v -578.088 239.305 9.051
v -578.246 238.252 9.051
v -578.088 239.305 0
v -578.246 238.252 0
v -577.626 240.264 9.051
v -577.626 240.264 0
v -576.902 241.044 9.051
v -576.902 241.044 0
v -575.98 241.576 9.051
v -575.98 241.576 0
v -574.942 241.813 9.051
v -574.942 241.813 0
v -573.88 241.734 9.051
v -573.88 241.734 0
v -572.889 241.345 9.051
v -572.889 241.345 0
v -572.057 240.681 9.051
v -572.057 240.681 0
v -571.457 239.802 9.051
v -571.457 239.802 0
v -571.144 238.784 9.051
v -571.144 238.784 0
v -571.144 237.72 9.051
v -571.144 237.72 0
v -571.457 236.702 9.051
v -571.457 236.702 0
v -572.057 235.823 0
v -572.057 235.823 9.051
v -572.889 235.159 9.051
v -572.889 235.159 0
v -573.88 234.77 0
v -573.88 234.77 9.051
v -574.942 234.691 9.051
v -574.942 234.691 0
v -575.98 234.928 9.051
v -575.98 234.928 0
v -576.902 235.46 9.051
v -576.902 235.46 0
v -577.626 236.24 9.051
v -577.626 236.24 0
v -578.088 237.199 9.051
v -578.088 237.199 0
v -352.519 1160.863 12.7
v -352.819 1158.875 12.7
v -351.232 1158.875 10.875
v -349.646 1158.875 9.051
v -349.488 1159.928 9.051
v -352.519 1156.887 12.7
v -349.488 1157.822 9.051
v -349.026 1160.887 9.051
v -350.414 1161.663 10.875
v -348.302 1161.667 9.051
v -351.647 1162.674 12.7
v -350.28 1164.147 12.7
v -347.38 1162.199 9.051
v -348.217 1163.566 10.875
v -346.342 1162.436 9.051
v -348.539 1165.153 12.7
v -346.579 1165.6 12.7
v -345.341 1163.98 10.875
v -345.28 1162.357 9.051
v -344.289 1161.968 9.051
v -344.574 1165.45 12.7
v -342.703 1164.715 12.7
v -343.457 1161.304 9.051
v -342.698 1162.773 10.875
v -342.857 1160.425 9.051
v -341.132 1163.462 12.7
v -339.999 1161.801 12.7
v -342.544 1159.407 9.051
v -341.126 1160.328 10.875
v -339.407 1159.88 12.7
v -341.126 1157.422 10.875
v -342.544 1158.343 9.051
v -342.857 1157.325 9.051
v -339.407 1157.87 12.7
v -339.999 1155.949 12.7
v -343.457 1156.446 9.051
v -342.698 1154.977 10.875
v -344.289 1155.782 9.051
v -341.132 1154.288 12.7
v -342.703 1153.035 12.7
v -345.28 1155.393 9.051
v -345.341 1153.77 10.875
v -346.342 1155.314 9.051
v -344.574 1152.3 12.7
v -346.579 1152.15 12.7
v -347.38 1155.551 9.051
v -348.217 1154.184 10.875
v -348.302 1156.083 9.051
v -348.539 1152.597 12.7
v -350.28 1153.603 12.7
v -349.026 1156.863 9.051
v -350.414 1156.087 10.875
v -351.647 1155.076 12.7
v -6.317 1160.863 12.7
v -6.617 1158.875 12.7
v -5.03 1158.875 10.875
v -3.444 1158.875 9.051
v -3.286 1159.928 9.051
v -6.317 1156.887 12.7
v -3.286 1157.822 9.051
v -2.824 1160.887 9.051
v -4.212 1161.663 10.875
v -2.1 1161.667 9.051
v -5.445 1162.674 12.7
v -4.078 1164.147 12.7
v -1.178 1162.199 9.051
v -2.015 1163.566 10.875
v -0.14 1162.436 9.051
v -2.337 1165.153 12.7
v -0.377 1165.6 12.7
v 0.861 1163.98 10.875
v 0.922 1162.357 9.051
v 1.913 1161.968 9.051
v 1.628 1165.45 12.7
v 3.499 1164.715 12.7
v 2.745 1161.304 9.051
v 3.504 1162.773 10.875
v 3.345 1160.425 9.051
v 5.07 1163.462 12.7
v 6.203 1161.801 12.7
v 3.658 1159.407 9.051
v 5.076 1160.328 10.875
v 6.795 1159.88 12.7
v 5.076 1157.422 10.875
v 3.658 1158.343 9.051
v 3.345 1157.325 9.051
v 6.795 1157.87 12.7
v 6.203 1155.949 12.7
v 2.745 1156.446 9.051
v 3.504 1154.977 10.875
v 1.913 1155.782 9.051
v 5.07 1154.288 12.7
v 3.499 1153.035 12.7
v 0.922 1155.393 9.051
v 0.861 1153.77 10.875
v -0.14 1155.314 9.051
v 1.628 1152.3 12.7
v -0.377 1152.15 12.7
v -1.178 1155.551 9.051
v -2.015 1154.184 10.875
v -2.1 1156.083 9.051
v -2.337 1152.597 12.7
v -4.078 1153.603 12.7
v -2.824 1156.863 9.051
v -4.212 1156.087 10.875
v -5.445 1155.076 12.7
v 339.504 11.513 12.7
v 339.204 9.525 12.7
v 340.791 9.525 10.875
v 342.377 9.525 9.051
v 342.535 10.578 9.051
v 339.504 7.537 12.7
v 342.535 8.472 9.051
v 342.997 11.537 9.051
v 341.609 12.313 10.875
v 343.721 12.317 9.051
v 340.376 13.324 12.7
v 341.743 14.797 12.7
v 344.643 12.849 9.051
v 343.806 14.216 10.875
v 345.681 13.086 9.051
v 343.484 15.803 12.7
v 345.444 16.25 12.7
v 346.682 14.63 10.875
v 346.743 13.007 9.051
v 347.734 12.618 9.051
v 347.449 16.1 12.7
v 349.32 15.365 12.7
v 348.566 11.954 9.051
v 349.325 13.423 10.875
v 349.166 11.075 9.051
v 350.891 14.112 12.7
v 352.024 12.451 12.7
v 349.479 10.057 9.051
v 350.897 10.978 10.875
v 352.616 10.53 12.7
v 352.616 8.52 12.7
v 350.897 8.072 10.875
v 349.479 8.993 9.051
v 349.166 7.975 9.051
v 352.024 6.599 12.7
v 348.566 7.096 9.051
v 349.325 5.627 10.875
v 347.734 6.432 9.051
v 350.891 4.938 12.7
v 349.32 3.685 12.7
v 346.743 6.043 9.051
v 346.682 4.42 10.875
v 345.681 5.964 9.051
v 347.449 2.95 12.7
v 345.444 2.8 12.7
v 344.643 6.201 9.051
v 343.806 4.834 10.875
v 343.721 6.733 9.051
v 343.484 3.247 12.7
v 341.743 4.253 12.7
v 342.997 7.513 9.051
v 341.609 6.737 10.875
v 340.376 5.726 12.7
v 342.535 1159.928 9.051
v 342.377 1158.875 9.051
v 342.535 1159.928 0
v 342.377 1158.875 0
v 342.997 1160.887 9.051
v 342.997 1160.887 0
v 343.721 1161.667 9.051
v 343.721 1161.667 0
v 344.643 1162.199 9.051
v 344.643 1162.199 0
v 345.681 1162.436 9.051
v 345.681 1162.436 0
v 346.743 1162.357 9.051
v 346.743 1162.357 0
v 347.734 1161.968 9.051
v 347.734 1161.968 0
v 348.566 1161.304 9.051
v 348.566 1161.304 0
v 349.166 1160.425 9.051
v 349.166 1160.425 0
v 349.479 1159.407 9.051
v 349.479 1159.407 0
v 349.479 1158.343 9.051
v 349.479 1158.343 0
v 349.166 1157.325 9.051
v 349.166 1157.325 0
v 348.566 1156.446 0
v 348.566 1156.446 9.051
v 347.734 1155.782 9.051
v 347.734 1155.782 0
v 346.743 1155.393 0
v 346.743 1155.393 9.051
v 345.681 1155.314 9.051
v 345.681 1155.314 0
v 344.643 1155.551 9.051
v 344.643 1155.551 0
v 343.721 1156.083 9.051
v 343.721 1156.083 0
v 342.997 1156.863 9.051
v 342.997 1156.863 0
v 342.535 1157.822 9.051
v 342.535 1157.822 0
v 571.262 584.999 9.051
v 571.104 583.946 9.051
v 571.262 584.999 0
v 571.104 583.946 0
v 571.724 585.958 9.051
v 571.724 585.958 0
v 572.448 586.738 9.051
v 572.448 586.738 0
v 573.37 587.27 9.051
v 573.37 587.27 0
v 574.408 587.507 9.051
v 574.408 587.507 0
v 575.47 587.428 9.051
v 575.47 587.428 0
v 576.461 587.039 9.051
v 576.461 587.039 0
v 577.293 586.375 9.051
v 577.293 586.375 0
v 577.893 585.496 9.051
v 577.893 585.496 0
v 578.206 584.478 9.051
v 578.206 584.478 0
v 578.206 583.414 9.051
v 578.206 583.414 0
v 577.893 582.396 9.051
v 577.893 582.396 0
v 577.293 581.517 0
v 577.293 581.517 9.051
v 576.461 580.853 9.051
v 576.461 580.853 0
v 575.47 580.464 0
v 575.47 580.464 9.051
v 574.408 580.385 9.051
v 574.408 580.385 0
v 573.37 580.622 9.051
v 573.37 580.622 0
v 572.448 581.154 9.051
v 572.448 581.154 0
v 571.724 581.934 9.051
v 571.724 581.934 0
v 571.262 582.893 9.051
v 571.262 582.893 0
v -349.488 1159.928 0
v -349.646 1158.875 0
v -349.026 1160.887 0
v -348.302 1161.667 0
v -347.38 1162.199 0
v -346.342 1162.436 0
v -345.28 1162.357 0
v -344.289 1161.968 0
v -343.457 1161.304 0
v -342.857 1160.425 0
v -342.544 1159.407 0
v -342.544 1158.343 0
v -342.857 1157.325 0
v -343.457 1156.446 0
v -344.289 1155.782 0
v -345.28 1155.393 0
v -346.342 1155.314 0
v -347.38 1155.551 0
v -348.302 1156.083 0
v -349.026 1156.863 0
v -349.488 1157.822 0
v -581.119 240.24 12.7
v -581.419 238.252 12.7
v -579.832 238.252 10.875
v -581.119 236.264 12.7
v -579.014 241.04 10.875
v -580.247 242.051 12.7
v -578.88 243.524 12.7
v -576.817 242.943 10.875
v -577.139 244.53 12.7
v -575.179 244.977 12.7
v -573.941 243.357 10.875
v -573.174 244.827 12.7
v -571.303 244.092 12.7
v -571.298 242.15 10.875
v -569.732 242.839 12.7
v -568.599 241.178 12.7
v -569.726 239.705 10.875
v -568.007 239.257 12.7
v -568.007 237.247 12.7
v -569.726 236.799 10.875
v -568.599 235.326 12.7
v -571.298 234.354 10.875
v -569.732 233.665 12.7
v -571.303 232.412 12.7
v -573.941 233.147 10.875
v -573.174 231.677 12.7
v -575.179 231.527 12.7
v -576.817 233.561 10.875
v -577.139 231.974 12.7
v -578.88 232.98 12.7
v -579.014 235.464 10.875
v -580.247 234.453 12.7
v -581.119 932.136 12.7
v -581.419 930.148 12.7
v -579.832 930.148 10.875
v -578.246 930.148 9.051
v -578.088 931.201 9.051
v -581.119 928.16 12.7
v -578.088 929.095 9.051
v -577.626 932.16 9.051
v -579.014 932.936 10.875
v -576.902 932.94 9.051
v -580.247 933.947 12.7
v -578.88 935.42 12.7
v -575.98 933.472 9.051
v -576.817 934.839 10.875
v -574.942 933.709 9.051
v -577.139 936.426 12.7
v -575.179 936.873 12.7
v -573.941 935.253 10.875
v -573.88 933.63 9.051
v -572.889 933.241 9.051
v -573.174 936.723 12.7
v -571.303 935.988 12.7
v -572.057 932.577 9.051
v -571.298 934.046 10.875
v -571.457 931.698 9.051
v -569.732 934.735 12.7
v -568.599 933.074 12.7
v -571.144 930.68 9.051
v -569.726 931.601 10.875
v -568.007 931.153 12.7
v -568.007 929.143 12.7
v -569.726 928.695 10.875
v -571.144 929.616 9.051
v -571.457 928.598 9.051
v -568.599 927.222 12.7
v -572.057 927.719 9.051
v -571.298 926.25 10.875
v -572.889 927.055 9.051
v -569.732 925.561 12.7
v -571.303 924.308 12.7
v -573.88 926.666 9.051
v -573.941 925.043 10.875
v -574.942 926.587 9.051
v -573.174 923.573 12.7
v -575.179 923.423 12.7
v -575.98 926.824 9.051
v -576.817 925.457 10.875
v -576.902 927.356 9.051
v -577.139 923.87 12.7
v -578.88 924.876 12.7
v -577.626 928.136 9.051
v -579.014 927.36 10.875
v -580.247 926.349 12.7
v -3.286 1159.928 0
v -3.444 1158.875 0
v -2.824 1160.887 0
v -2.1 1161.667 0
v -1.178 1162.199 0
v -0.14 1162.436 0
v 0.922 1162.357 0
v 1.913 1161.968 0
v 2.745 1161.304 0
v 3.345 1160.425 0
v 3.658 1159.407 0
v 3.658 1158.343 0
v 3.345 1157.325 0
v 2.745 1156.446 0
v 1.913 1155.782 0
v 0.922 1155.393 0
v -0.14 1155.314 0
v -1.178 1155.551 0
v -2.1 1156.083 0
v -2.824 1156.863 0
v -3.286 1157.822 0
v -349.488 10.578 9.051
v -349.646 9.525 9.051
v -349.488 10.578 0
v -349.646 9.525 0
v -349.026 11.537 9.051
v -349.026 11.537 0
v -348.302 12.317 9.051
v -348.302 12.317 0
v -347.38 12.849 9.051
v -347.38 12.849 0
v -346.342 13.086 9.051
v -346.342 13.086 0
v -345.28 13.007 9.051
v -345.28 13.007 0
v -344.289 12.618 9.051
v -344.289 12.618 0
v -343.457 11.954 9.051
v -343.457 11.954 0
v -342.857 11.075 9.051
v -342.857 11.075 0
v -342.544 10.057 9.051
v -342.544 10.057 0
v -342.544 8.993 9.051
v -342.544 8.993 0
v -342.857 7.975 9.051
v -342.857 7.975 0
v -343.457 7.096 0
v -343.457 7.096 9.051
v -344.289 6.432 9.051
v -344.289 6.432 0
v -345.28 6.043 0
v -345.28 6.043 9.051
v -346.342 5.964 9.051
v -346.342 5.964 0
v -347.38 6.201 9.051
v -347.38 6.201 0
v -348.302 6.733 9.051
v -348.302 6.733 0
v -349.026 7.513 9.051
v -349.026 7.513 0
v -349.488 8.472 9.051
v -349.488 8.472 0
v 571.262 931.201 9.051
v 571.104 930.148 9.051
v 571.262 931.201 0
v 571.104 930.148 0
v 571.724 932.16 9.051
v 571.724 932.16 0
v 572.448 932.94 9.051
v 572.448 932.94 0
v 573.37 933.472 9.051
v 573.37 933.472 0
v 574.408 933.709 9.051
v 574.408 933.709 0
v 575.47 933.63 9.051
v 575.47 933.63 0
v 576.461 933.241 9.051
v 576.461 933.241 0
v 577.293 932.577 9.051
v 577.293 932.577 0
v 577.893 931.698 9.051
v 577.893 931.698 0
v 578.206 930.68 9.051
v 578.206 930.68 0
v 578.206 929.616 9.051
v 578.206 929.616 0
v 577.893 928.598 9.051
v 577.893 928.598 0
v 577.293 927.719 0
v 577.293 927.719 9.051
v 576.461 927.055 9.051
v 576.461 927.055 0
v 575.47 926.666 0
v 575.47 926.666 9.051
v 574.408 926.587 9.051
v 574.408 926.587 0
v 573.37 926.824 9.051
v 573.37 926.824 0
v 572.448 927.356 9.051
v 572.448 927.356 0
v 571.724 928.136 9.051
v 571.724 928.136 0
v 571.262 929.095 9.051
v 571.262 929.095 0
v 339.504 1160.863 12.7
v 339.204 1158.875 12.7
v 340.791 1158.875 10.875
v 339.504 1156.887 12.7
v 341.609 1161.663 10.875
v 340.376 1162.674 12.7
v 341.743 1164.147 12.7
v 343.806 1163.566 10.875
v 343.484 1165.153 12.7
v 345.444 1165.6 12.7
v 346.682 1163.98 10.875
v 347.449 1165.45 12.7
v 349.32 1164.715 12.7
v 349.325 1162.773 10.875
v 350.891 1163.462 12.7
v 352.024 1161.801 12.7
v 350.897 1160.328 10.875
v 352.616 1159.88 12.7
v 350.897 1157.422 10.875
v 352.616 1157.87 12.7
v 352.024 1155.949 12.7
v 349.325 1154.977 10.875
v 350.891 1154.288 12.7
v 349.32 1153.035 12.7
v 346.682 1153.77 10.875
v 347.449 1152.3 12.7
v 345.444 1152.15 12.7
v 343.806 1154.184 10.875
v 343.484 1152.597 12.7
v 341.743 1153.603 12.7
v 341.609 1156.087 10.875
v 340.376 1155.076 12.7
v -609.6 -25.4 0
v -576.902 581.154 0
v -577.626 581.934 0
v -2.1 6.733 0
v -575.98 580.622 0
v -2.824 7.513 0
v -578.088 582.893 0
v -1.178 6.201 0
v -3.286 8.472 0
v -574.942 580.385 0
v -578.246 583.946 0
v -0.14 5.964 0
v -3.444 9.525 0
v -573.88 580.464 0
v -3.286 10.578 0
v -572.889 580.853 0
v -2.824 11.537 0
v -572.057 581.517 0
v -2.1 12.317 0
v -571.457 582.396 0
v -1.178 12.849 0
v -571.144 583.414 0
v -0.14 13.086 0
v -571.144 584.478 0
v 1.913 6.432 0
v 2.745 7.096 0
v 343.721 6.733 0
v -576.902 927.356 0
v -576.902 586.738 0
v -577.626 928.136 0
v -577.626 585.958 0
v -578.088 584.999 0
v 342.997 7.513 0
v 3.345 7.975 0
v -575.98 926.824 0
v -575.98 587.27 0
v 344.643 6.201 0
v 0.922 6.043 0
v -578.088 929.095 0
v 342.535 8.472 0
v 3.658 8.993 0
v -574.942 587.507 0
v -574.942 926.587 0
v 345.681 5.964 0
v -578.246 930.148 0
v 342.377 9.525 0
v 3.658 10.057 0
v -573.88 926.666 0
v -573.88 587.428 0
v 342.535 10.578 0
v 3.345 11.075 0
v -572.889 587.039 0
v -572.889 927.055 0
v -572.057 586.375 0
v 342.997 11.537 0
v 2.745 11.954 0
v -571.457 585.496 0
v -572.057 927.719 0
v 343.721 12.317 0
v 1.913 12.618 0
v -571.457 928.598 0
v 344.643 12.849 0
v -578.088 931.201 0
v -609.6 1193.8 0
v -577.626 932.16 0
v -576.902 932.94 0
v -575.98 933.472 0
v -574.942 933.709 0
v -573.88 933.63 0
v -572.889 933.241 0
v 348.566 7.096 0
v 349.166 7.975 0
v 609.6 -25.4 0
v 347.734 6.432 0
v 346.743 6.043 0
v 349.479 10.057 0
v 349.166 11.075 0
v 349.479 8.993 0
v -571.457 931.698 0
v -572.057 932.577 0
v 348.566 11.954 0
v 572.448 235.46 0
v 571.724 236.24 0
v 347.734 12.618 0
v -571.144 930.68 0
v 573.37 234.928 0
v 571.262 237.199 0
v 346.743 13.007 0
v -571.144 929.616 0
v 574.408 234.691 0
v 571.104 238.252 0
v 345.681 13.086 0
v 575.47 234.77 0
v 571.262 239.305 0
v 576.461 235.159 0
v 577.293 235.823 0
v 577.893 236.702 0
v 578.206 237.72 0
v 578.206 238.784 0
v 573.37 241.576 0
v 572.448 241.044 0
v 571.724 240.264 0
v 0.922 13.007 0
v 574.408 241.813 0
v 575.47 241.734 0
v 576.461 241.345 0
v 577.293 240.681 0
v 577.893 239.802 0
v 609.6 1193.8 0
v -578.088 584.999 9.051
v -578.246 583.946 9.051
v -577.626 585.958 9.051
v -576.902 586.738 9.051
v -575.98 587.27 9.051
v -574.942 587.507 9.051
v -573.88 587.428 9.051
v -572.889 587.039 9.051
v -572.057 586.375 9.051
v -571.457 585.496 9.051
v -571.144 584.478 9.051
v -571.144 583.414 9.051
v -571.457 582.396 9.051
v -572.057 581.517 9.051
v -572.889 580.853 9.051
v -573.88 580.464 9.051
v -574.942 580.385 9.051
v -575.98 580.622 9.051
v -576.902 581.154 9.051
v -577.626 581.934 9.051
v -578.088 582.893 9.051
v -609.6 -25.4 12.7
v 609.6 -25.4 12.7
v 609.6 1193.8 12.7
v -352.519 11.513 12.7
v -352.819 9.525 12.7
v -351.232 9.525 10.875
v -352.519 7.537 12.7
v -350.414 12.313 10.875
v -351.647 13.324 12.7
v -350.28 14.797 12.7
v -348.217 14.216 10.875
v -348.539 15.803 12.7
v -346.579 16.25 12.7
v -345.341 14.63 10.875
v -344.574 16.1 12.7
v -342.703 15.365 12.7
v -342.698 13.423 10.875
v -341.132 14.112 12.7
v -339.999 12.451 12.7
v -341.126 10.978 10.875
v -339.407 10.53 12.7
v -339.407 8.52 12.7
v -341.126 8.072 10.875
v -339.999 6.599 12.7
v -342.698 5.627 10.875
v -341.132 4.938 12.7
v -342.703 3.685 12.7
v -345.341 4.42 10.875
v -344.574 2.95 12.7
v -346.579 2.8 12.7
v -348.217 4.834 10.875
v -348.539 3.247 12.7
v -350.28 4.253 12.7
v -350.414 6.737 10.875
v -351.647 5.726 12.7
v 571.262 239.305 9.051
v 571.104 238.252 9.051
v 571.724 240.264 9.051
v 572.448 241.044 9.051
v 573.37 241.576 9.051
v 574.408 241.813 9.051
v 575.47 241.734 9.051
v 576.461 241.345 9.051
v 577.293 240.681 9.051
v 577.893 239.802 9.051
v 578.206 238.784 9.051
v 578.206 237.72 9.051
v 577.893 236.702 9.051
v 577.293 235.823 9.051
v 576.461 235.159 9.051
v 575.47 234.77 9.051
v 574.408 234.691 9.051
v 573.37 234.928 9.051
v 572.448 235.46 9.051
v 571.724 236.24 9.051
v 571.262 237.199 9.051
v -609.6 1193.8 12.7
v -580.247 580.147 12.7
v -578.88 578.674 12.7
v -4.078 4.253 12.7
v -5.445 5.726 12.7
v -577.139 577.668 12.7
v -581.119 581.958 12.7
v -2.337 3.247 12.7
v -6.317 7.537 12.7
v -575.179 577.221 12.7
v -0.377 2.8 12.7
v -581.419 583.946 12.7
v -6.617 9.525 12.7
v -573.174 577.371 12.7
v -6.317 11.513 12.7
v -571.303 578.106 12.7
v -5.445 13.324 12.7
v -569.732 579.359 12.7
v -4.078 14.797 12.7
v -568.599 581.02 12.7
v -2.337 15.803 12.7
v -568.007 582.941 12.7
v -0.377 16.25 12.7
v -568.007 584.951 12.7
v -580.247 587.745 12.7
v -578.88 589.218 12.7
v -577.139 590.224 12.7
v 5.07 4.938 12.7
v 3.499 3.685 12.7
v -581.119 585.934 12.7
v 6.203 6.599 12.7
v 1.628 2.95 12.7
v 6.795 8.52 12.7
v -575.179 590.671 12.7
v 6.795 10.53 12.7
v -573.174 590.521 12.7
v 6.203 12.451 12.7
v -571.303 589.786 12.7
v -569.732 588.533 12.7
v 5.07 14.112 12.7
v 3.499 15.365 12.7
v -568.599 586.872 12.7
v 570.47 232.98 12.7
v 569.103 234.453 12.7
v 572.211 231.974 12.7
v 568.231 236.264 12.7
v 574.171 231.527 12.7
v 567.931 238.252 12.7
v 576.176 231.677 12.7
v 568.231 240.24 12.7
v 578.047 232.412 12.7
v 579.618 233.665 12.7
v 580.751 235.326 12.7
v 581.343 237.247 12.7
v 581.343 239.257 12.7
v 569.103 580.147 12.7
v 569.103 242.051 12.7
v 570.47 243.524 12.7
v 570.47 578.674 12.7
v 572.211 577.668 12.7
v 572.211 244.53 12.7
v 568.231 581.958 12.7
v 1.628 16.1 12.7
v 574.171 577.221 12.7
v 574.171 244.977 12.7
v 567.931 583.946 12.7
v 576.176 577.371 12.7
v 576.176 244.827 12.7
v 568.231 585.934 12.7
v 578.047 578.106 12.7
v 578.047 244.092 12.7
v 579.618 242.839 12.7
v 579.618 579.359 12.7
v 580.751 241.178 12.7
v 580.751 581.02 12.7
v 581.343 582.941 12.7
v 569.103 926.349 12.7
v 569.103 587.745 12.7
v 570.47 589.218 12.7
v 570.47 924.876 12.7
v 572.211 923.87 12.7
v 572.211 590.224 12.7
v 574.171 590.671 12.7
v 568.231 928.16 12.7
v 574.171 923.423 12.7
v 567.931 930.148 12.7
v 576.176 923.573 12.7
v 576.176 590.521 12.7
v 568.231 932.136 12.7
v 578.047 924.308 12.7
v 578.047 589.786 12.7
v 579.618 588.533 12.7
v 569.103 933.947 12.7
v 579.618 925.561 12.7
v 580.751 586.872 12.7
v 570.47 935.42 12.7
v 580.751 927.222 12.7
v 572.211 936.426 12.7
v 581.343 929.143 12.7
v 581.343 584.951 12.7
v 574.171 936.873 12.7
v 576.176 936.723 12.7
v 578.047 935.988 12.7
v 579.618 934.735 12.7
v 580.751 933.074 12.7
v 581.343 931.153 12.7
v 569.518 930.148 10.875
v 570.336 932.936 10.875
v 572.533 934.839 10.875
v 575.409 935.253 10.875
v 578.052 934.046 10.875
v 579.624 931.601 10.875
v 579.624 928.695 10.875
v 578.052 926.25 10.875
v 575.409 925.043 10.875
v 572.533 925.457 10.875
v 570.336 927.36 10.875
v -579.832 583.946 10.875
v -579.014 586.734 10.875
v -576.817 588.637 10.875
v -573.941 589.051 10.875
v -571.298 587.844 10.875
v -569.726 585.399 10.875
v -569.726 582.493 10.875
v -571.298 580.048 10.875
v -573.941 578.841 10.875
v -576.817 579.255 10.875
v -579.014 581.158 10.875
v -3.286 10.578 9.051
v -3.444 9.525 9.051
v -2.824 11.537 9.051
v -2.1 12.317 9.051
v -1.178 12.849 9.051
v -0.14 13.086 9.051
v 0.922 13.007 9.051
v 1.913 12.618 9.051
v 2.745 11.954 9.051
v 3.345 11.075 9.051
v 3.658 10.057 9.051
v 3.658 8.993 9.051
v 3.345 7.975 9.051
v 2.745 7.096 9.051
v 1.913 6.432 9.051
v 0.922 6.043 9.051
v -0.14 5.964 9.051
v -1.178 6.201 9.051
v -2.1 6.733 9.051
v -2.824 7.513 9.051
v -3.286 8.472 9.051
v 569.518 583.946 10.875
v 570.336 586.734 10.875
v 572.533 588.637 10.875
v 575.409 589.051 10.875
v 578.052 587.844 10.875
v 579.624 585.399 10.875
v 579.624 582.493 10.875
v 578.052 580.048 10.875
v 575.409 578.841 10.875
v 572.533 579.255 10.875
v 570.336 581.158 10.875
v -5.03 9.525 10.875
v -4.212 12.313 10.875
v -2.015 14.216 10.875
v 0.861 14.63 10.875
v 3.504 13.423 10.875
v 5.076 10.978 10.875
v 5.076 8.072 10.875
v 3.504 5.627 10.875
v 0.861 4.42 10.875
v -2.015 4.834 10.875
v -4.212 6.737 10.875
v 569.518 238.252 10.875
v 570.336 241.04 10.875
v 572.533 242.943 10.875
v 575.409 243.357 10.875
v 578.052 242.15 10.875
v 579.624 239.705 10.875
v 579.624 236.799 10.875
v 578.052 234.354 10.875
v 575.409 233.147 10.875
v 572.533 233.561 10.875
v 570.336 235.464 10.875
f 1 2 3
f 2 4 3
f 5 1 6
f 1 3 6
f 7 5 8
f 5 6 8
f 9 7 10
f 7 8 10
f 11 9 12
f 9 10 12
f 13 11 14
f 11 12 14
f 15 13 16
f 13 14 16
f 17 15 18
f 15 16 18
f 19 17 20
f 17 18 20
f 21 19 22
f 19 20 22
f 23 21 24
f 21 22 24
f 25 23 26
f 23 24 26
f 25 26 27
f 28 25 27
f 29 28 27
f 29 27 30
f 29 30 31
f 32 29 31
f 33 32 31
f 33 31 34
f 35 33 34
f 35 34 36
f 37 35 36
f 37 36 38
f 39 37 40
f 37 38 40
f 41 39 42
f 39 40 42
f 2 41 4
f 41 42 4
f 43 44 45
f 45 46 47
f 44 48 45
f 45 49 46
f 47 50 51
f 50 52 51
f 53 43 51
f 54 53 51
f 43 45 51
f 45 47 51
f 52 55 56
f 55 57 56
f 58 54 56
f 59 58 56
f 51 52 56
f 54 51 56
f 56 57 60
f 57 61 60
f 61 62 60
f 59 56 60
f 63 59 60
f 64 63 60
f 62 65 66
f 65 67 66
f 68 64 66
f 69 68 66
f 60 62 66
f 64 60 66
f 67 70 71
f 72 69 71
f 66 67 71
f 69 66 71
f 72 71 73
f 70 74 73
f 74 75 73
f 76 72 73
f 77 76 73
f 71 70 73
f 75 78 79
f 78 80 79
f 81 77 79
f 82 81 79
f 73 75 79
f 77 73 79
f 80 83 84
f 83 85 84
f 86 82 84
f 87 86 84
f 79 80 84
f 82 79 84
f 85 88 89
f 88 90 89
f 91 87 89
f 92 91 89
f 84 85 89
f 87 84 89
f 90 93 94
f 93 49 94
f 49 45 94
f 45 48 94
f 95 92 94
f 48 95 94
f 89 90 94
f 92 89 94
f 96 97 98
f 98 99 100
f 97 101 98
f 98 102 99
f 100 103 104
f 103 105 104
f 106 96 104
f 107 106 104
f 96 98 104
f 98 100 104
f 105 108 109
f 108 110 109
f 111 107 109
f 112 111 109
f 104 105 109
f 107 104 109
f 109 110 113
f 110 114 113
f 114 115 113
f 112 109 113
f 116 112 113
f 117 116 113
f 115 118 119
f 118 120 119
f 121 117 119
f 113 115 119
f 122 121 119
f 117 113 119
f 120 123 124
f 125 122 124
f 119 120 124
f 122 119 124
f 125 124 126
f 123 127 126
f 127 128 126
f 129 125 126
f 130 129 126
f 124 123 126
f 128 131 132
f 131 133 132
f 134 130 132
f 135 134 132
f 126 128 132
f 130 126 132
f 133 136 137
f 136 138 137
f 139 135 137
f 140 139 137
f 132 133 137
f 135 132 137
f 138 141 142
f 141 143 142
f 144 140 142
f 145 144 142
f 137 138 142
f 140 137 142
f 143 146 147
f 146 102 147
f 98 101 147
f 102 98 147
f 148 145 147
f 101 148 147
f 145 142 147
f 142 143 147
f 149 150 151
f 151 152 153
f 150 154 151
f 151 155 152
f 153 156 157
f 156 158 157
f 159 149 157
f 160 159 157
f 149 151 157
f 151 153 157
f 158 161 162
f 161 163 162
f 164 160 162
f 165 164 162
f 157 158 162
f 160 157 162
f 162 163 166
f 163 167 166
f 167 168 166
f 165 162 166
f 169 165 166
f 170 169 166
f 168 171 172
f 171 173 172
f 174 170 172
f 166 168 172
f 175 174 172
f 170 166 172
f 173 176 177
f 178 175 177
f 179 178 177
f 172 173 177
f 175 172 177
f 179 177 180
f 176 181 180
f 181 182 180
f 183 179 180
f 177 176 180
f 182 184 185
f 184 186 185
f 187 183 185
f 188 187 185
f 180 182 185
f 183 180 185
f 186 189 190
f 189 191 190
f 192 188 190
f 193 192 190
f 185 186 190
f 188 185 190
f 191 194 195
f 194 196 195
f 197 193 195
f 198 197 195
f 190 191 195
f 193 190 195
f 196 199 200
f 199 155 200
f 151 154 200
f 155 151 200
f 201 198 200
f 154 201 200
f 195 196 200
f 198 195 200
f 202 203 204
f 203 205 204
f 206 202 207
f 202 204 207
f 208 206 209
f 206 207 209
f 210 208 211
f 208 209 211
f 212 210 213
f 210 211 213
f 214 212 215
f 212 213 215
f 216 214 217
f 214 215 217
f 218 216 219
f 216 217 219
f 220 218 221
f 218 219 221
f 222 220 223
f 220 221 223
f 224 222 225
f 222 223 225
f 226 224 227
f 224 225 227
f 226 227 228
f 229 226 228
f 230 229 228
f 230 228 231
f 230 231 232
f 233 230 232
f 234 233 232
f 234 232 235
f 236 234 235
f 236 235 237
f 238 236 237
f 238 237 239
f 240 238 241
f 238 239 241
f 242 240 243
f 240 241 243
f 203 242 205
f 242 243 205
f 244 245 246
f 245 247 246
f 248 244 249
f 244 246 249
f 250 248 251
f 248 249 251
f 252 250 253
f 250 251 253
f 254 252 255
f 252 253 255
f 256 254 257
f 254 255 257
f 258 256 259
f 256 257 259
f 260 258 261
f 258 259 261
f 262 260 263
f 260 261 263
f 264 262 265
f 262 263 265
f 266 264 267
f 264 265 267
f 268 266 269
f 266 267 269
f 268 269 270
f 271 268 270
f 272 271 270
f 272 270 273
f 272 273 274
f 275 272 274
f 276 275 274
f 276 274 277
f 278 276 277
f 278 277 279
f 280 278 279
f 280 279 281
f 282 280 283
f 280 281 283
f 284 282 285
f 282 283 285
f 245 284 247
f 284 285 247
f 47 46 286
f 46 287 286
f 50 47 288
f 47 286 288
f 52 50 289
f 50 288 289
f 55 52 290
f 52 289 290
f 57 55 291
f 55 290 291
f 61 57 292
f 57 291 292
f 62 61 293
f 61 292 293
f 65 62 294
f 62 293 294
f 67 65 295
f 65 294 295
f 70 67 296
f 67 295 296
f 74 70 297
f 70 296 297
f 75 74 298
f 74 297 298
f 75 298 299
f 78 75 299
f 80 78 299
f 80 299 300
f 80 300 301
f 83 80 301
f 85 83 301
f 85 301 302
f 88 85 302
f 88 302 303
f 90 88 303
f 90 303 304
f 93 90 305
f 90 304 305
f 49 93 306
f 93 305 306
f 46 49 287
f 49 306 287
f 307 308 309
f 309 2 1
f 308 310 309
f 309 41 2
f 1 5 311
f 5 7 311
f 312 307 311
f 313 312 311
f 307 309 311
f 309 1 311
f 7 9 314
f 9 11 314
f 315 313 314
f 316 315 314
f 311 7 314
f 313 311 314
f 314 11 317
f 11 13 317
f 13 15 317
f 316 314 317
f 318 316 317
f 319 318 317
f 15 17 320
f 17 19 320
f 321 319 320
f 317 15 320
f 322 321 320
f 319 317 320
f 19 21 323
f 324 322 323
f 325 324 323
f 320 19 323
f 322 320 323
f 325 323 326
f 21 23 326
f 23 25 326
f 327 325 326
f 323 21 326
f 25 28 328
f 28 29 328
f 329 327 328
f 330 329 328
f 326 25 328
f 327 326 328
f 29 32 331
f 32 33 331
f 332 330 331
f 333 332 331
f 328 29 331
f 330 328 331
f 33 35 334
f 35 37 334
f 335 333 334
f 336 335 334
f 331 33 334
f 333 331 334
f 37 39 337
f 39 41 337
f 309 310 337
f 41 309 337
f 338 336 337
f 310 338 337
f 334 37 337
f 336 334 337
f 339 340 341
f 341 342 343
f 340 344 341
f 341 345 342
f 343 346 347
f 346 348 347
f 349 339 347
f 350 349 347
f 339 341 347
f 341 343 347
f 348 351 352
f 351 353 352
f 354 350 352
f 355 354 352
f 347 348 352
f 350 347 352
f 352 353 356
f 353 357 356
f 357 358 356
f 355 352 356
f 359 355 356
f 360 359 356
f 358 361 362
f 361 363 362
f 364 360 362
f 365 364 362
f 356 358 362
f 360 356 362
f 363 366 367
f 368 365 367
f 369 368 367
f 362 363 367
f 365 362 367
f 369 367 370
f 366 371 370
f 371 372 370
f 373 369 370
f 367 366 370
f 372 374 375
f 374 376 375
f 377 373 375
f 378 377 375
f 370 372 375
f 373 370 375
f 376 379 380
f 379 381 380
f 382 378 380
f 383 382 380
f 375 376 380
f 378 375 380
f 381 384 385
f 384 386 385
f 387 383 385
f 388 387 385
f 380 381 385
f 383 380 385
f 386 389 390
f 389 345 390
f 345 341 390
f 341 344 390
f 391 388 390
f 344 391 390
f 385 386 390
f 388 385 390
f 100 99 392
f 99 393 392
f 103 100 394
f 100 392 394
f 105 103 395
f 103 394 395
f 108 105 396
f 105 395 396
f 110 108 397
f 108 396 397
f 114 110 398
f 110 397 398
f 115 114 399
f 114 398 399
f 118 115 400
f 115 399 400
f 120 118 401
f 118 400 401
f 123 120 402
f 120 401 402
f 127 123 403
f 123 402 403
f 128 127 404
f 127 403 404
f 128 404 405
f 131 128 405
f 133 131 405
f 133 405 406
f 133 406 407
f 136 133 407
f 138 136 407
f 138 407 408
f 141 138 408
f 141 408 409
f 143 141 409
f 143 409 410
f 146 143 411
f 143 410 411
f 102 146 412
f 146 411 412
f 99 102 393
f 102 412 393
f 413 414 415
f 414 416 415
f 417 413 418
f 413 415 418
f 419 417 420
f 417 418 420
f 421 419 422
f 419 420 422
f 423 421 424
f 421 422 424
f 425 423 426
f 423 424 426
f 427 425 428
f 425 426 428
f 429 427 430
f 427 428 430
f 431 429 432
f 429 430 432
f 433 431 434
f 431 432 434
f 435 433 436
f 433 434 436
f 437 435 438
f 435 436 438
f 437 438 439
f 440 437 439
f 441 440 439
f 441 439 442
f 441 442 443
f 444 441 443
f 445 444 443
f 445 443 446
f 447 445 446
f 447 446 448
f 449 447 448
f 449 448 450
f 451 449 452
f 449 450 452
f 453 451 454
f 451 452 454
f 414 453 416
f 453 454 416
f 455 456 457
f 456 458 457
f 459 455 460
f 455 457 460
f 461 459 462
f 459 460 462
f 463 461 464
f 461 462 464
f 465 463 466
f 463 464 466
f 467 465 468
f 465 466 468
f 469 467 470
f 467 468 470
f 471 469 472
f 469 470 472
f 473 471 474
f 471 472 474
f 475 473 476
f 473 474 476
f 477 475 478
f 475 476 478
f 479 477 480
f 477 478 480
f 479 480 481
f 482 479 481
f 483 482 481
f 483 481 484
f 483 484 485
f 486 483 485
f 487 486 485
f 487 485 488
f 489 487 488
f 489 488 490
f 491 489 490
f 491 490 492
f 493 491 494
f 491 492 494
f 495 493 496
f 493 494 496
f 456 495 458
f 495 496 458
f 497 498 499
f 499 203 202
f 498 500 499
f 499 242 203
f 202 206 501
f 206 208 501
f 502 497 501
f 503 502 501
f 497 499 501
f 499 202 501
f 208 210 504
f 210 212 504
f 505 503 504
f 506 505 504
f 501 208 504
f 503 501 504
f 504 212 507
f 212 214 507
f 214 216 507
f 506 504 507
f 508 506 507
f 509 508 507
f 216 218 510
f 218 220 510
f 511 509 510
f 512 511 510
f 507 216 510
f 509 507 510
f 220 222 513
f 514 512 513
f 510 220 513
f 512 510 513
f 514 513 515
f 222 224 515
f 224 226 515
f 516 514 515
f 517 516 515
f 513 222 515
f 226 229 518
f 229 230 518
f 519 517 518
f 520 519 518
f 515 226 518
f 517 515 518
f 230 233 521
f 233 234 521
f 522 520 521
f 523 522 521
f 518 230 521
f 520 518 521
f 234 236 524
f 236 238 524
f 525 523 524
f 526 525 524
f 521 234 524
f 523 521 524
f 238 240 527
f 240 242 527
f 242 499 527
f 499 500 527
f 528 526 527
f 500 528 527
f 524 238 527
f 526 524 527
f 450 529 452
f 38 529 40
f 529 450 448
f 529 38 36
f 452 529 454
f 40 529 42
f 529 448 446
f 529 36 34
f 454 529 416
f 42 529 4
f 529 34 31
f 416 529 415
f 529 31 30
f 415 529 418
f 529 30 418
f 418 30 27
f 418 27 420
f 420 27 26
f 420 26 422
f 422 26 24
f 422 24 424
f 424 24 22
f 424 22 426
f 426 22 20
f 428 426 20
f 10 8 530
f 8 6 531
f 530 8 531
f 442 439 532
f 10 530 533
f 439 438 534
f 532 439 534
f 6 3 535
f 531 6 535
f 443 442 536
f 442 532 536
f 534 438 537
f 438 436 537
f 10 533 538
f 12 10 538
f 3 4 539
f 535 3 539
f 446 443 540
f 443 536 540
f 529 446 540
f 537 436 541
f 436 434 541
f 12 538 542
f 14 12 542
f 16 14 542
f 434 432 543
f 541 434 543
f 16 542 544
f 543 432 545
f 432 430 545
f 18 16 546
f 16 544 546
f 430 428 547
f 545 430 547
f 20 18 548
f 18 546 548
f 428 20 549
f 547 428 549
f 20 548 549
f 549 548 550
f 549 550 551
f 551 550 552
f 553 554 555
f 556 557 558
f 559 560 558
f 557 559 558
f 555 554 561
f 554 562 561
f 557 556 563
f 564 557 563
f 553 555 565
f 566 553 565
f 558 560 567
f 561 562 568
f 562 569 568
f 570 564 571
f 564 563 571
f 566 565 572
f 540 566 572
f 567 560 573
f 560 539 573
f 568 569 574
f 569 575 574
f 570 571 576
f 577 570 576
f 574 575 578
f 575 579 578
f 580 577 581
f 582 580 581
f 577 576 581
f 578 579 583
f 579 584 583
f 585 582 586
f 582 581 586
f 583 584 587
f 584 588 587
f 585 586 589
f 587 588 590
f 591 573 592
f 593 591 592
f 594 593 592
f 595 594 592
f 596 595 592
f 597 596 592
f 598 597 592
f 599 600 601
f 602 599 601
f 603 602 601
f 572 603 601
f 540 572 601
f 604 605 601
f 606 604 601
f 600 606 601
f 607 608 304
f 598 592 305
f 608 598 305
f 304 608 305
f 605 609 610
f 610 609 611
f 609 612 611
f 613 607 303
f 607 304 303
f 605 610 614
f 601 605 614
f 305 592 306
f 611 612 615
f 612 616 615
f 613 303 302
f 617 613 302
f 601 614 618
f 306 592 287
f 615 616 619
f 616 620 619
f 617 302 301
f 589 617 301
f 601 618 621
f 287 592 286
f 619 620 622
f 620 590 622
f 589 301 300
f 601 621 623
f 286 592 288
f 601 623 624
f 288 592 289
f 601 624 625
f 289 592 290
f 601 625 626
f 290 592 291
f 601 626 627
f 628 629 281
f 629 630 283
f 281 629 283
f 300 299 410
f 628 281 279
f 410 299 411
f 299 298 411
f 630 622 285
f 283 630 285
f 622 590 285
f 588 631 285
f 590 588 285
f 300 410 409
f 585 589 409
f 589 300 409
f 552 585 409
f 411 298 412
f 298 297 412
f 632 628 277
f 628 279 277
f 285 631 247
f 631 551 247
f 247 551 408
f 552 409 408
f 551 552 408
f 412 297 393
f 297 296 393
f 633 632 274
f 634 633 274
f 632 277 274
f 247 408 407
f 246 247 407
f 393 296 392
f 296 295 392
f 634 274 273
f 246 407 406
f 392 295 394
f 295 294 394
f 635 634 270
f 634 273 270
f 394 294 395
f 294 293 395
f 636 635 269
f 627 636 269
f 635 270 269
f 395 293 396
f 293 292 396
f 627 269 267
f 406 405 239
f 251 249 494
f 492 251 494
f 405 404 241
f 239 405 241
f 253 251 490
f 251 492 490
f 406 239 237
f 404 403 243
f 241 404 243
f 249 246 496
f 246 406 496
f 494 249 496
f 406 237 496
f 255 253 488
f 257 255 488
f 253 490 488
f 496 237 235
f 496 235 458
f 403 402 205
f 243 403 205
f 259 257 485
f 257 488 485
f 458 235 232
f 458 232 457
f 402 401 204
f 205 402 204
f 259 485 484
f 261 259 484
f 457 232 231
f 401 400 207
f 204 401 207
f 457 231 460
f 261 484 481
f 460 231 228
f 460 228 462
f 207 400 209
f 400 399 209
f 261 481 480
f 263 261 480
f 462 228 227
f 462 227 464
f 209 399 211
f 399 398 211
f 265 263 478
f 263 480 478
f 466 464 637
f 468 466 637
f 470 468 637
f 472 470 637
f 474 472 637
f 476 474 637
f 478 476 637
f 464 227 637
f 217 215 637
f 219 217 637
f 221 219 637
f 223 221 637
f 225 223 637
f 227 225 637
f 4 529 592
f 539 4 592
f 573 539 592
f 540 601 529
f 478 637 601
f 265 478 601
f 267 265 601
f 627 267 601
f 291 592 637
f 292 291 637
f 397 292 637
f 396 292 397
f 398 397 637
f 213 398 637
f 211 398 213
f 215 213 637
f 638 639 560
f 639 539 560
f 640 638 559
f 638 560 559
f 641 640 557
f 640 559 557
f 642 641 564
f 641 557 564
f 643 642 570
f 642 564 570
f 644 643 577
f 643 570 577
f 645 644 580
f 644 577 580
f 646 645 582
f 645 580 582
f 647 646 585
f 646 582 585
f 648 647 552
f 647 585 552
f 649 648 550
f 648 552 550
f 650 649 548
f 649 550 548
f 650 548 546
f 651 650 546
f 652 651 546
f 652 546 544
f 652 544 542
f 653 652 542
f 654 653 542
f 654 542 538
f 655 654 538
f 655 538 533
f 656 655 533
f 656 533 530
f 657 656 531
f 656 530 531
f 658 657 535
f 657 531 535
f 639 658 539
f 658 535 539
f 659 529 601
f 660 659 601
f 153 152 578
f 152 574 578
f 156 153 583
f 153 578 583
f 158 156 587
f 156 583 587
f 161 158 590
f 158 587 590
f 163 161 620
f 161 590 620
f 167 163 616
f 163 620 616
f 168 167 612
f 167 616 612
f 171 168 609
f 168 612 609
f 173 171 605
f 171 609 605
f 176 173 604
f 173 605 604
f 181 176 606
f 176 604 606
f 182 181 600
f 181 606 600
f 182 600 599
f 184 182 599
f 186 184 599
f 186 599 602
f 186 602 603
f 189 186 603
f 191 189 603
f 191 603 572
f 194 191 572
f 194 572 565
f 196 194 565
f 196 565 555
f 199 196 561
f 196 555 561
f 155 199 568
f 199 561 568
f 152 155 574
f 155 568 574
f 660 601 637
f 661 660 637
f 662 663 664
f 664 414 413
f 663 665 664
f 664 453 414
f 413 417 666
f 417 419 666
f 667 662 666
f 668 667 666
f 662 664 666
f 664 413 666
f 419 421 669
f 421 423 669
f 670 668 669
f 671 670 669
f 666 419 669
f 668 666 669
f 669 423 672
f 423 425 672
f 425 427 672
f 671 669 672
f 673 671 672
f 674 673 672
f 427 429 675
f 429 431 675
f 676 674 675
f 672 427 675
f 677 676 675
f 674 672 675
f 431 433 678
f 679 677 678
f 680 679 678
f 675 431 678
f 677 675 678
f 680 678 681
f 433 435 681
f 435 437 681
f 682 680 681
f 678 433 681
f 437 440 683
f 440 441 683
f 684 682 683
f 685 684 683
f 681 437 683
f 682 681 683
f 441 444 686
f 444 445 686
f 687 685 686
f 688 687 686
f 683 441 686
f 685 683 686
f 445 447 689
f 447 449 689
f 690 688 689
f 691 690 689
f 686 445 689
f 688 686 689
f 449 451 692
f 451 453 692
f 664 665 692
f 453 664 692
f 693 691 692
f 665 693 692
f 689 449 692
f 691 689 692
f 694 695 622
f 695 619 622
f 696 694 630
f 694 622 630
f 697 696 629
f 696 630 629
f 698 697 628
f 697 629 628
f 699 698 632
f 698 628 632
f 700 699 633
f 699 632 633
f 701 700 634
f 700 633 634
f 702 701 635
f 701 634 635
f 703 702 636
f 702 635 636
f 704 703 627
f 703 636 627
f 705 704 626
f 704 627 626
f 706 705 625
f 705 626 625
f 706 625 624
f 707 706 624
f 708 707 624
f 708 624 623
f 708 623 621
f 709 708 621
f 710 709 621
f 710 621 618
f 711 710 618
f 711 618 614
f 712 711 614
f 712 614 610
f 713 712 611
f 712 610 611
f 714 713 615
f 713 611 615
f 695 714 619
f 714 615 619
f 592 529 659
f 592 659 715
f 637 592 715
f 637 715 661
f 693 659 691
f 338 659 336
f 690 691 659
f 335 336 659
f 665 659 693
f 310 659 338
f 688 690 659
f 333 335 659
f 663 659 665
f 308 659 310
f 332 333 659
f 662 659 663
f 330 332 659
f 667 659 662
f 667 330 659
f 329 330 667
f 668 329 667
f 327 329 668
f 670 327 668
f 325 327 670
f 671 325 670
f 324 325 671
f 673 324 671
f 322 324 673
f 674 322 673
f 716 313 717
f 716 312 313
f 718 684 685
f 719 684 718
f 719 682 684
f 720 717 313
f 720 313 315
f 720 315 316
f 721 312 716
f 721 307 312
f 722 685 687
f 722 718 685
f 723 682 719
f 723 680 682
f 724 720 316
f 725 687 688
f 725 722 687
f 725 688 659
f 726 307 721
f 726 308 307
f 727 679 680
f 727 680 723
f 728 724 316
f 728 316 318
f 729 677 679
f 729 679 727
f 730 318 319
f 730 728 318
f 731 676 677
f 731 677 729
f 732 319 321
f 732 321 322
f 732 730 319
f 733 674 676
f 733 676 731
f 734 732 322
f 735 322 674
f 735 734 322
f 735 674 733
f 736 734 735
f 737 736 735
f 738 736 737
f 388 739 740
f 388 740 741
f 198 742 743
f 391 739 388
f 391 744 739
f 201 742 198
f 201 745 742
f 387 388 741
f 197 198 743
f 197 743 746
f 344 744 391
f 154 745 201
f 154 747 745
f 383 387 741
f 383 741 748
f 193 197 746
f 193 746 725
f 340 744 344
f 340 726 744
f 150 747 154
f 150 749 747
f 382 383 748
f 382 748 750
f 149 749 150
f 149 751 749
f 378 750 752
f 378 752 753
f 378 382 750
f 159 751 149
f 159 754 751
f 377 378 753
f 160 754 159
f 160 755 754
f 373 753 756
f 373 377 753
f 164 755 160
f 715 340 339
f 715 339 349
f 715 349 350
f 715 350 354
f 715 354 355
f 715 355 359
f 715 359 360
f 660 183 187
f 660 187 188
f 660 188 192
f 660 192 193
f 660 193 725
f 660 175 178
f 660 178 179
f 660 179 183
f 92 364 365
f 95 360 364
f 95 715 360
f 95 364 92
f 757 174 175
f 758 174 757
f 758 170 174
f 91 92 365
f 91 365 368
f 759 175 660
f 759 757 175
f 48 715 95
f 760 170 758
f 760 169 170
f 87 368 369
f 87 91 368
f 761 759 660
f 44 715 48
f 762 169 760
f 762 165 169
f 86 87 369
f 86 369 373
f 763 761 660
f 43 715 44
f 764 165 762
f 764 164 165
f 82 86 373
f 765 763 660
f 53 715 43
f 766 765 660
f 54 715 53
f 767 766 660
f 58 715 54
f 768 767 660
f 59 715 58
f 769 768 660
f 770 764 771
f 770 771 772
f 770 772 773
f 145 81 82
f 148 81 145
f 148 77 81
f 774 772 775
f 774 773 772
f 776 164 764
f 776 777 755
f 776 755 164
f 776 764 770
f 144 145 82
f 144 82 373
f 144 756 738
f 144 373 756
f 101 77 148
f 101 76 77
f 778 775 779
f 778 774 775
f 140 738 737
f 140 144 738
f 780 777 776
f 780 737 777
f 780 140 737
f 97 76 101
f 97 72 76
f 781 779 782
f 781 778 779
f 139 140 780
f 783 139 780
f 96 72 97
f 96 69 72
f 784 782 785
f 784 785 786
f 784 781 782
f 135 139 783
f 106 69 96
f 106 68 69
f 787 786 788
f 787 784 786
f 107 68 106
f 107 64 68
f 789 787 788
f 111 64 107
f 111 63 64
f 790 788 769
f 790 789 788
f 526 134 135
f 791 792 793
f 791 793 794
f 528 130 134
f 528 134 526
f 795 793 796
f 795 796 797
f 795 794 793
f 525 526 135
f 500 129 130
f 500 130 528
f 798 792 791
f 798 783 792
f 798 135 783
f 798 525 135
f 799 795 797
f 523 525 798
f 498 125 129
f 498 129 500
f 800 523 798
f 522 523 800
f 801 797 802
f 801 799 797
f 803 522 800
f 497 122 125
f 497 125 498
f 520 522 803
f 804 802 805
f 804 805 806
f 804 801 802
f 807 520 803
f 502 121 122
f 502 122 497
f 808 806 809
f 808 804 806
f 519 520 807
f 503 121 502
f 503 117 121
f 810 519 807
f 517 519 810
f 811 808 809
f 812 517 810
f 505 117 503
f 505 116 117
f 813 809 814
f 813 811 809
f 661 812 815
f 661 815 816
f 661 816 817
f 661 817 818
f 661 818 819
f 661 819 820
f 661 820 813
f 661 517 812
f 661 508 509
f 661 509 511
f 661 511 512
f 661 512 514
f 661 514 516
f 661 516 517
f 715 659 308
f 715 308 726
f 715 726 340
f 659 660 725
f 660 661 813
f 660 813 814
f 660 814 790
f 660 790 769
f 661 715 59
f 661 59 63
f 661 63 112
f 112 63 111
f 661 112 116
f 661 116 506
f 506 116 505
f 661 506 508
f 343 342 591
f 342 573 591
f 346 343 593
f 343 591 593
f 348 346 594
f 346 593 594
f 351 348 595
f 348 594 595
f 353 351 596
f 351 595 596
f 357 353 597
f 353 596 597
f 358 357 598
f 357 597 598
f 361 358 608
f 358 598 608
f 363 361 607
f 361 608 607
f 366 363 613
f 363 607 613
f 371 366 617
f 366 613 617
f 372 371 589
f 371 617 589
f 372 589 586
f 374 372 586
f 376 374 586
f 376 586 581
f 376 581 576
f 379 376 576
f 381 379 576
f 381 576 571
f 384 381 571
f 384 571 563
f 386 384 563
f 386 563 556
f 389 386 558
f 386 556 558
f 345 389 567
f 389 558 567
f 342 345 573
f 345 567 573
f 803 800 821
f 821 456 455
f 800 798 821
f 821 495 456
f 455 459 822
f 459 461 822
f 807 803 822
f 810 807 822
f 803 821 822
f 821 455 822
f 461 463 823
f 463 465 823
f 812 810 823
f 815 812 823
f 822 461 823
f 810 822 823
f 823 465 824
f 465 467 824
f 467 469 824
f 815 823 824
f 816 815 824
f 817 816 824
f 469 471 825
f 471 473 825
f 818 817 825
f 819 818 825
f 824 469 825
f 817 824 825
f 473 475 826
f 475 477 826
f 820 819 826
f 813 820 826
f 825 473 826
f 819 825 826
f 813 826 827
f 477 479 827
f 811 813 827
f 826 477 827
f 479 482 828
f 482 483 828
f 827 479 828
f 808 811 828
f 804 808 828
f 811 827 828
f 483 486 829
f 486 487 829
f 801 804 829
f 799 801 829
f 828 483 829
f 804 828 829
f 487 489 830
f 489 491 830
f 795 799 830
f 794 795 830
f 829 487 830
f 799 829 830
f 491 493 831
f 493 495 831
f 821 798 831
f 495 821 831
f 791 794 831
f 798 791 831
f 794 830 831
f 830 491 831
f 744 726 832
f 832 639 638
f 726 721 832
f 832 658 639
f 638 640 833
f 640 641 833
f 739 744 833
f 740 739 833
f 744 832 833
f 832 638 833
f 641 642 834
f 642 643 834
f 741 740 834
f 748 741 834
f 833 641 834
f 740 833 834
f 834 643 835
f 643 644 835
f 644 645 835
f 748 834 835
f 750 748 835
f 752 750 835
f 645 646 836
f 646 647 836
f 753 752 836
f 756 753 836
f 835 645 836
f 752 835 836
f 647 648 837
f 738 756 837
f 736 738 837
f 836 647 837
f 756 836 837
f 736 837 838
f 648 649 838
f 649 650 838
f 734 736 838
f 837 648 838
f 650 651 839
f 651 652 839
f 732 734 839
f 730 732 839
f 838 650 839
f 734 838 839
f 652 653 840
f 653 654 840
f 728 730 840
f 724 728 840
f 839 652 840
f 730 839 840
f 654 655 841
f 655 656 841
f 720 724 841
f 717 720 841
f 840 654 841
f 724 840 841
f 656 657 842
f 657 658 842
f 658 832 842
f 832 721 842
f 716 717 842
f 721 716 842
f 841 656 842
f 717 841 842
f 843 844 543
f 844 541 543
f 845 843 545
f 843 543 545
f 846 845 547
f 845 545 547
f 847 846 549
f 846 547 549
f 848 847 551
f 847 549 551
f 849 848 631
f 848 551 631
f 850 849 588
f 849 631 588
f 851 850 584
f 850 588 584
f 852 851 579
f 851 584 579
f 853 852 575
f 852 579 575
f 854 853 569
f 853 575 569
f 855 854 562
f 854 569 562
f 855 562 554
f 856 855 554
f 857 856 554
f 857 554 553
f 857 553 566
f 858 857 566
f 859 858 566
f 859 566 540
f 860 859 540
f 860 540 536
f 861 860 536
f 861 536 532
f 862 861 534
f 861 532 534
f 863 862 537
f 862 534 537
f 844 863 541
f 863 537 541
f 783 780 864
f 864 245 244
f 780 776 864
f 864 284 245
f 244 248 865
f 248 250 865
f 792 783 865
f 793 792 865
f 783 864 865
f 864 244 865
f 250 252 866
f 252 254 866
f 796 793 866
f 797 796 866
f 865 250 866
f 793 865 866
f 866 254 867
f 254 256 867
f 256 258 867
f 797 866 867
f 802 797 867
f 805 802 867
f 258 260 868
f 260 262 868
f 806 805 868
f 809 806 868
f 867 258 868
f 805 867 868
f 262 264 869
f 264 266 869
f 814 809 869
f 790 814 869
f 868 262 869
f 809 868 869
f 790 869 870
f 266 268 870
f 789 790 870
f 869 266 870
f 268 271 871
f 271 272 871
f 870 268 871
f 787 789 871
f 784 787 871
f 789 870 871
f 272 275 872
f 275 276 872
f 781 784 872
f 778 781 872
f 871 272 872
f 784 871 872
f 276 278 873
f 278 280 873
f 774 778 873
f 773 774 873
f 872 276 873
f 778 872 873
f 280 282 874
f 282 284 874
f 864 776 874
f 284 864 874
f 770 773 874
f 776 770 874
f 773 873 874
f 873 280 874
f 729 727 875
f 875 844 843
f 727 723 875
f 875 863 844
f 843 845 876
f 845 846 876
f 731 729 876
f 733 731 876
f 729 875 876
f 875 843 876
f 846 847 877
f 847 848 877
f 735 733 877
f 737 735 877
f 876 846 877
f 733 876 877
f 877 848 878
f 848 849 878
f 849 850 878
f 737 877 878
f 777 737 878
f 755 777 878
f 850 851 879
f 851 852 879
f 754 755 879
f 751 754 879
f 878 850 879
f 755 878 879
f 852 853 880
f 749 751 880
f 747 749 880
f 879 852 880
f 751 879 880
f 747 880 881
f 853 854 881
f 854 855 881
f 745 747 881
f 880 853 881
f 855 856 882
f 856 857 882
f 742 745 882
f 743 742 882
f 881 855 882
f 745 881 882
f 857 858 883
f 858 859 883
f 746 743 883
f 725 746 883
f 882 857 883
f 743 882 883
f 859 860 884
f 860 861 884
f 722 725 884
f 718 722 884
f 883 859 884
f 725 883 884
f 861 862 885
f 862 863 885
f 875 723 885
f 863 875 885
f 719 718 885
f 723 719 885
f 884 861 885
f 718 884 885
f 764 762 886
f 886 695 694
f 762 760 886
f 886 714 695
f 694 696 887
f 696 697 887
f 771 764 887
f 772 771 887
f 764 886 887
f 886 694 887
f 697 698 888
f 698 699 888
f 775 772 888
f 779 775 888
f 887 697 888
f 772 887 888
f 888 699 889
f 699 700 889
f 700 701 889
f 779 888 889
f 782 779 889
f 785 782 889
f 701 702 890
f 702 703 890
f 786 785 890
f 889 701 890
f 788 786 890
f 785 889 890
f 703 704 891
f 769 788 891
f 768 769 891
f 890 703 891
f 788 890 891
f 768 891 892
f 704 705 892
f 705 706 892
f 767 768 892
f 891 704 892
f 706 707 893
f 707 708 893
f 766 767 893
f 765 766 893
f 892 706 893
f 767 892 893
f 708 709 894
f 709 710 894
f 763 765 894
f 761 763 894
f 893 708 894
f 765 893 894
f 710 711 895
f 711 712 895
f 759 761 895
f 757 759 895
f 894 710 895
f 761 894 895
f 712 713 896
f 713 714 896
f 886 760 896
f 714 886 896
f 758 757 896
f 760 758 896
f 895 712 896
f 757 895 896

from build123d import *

# Parameters (mm, degrees)
SKETCH1_W                                           = 1219.2
SKETCH1_H                                           = 1219.2
BOSS_EXTRUDE1_DEPTH                                 = 12.7
SKETCH2_R                                           = 3.302
CUT_EXTRUDE4_DEPTH                                  = 12.7
CSK_FOR_1_4_FLAT_HEAD_SOCKET_CAP_SCREW1_D           = 7.14248
CSK_FOR_1_4_FLAT_HEAD_SOCKET_CAP_SCREW1_CSINK_D     = 13.4874
CSK_FOR_1_4_FLAT_HEAD_SOCKET_CAP_SCREW1_CSINK_ANGLE = 82


with BuildPart() as part:
    # Sketch1 → Boss-Extrude1 (new body)
    with BuildSketch(Plane.XY):
        with Locations((0, 584.2)):
            Rectangle(SKETCH1_W, SKETCH1_H)
    extrude(amount=BOSS_EXTRUDE1_DEPTH)

    # Sketch2 → Cut-Extrude4 (cut)
    with BuildSketch(Plane.XY.offset(12.7)):
        with Locations((-346.075, 1158.875)):
            Circle(SKETCH2_R)
        with Locations((0.127, 1158.875)):
            Circle(SKETCH2_R)
        with Locations((345.948, 1158.875)):
            Circle(SKETCH2_R)
        with Locations((345.948, 9.525)):
            Circle(SKETCH2_R)
        with Locations((0.127, 9.525)):
            Circle(SKETCH2_R)
        with Locations((-346.075, 9.525)):
            Circle(SKETCH2_R)
        with Locations((-574.675, 930.148)):
            Circle(SKETCH2_R)
        with Locations((-574.675, 583.946)):
            Circle(SKETCH2_R)
        with Locations((-574.675, 238.252)):
            Circle(SKETCH2_R)
        with Locations((574.675, 930.148)):
            Circle(SKETCH2_R)
        with Locations((574.675, 583.946)):
            Circle(SKETCH2_R)
        with Locations((574.675, 238.252)):
            Circle(SKETCH2_R)
    extrude(amount=-CUT_EXTRUDE4_DEPTH, mode=Mode.SUBTRACT)

    # CSK for 1/4 Flat Head Socket Cap Screw1 (through all)
    with Locations(Plane(origin=(345.948, 9.525, 12.7), x_dir=(1, 0, 0), z_dir=(0, 0, 1))):
        with Locations((0, 0), (-345.821, 0), (-692.023, 0), (-920.623, 228.727), (-920.623, 574.421), (-920.623, 920.623), (-692.023, 1149.35), (-345.821, 1149.35), (0, 1149.35), (228.727, 920.623), (228.727, 574.421), (228.727, 228.727)):
            CounterSinkHole(CSK_FOR_1_4_FLAT_HEAD_SOCKET_CAP_SCREW1_D / 2, CSK_FOR_1_4_FLAT_HEAD_SOCKET_CAP_SCREW1_CSINK_D / 2, counter_sink_angle=CSK_FOR_1_4_FLAT_HEAD_SOCKET_CAP_SCREW1_CSINK_ANGLE)


solid = part.part
